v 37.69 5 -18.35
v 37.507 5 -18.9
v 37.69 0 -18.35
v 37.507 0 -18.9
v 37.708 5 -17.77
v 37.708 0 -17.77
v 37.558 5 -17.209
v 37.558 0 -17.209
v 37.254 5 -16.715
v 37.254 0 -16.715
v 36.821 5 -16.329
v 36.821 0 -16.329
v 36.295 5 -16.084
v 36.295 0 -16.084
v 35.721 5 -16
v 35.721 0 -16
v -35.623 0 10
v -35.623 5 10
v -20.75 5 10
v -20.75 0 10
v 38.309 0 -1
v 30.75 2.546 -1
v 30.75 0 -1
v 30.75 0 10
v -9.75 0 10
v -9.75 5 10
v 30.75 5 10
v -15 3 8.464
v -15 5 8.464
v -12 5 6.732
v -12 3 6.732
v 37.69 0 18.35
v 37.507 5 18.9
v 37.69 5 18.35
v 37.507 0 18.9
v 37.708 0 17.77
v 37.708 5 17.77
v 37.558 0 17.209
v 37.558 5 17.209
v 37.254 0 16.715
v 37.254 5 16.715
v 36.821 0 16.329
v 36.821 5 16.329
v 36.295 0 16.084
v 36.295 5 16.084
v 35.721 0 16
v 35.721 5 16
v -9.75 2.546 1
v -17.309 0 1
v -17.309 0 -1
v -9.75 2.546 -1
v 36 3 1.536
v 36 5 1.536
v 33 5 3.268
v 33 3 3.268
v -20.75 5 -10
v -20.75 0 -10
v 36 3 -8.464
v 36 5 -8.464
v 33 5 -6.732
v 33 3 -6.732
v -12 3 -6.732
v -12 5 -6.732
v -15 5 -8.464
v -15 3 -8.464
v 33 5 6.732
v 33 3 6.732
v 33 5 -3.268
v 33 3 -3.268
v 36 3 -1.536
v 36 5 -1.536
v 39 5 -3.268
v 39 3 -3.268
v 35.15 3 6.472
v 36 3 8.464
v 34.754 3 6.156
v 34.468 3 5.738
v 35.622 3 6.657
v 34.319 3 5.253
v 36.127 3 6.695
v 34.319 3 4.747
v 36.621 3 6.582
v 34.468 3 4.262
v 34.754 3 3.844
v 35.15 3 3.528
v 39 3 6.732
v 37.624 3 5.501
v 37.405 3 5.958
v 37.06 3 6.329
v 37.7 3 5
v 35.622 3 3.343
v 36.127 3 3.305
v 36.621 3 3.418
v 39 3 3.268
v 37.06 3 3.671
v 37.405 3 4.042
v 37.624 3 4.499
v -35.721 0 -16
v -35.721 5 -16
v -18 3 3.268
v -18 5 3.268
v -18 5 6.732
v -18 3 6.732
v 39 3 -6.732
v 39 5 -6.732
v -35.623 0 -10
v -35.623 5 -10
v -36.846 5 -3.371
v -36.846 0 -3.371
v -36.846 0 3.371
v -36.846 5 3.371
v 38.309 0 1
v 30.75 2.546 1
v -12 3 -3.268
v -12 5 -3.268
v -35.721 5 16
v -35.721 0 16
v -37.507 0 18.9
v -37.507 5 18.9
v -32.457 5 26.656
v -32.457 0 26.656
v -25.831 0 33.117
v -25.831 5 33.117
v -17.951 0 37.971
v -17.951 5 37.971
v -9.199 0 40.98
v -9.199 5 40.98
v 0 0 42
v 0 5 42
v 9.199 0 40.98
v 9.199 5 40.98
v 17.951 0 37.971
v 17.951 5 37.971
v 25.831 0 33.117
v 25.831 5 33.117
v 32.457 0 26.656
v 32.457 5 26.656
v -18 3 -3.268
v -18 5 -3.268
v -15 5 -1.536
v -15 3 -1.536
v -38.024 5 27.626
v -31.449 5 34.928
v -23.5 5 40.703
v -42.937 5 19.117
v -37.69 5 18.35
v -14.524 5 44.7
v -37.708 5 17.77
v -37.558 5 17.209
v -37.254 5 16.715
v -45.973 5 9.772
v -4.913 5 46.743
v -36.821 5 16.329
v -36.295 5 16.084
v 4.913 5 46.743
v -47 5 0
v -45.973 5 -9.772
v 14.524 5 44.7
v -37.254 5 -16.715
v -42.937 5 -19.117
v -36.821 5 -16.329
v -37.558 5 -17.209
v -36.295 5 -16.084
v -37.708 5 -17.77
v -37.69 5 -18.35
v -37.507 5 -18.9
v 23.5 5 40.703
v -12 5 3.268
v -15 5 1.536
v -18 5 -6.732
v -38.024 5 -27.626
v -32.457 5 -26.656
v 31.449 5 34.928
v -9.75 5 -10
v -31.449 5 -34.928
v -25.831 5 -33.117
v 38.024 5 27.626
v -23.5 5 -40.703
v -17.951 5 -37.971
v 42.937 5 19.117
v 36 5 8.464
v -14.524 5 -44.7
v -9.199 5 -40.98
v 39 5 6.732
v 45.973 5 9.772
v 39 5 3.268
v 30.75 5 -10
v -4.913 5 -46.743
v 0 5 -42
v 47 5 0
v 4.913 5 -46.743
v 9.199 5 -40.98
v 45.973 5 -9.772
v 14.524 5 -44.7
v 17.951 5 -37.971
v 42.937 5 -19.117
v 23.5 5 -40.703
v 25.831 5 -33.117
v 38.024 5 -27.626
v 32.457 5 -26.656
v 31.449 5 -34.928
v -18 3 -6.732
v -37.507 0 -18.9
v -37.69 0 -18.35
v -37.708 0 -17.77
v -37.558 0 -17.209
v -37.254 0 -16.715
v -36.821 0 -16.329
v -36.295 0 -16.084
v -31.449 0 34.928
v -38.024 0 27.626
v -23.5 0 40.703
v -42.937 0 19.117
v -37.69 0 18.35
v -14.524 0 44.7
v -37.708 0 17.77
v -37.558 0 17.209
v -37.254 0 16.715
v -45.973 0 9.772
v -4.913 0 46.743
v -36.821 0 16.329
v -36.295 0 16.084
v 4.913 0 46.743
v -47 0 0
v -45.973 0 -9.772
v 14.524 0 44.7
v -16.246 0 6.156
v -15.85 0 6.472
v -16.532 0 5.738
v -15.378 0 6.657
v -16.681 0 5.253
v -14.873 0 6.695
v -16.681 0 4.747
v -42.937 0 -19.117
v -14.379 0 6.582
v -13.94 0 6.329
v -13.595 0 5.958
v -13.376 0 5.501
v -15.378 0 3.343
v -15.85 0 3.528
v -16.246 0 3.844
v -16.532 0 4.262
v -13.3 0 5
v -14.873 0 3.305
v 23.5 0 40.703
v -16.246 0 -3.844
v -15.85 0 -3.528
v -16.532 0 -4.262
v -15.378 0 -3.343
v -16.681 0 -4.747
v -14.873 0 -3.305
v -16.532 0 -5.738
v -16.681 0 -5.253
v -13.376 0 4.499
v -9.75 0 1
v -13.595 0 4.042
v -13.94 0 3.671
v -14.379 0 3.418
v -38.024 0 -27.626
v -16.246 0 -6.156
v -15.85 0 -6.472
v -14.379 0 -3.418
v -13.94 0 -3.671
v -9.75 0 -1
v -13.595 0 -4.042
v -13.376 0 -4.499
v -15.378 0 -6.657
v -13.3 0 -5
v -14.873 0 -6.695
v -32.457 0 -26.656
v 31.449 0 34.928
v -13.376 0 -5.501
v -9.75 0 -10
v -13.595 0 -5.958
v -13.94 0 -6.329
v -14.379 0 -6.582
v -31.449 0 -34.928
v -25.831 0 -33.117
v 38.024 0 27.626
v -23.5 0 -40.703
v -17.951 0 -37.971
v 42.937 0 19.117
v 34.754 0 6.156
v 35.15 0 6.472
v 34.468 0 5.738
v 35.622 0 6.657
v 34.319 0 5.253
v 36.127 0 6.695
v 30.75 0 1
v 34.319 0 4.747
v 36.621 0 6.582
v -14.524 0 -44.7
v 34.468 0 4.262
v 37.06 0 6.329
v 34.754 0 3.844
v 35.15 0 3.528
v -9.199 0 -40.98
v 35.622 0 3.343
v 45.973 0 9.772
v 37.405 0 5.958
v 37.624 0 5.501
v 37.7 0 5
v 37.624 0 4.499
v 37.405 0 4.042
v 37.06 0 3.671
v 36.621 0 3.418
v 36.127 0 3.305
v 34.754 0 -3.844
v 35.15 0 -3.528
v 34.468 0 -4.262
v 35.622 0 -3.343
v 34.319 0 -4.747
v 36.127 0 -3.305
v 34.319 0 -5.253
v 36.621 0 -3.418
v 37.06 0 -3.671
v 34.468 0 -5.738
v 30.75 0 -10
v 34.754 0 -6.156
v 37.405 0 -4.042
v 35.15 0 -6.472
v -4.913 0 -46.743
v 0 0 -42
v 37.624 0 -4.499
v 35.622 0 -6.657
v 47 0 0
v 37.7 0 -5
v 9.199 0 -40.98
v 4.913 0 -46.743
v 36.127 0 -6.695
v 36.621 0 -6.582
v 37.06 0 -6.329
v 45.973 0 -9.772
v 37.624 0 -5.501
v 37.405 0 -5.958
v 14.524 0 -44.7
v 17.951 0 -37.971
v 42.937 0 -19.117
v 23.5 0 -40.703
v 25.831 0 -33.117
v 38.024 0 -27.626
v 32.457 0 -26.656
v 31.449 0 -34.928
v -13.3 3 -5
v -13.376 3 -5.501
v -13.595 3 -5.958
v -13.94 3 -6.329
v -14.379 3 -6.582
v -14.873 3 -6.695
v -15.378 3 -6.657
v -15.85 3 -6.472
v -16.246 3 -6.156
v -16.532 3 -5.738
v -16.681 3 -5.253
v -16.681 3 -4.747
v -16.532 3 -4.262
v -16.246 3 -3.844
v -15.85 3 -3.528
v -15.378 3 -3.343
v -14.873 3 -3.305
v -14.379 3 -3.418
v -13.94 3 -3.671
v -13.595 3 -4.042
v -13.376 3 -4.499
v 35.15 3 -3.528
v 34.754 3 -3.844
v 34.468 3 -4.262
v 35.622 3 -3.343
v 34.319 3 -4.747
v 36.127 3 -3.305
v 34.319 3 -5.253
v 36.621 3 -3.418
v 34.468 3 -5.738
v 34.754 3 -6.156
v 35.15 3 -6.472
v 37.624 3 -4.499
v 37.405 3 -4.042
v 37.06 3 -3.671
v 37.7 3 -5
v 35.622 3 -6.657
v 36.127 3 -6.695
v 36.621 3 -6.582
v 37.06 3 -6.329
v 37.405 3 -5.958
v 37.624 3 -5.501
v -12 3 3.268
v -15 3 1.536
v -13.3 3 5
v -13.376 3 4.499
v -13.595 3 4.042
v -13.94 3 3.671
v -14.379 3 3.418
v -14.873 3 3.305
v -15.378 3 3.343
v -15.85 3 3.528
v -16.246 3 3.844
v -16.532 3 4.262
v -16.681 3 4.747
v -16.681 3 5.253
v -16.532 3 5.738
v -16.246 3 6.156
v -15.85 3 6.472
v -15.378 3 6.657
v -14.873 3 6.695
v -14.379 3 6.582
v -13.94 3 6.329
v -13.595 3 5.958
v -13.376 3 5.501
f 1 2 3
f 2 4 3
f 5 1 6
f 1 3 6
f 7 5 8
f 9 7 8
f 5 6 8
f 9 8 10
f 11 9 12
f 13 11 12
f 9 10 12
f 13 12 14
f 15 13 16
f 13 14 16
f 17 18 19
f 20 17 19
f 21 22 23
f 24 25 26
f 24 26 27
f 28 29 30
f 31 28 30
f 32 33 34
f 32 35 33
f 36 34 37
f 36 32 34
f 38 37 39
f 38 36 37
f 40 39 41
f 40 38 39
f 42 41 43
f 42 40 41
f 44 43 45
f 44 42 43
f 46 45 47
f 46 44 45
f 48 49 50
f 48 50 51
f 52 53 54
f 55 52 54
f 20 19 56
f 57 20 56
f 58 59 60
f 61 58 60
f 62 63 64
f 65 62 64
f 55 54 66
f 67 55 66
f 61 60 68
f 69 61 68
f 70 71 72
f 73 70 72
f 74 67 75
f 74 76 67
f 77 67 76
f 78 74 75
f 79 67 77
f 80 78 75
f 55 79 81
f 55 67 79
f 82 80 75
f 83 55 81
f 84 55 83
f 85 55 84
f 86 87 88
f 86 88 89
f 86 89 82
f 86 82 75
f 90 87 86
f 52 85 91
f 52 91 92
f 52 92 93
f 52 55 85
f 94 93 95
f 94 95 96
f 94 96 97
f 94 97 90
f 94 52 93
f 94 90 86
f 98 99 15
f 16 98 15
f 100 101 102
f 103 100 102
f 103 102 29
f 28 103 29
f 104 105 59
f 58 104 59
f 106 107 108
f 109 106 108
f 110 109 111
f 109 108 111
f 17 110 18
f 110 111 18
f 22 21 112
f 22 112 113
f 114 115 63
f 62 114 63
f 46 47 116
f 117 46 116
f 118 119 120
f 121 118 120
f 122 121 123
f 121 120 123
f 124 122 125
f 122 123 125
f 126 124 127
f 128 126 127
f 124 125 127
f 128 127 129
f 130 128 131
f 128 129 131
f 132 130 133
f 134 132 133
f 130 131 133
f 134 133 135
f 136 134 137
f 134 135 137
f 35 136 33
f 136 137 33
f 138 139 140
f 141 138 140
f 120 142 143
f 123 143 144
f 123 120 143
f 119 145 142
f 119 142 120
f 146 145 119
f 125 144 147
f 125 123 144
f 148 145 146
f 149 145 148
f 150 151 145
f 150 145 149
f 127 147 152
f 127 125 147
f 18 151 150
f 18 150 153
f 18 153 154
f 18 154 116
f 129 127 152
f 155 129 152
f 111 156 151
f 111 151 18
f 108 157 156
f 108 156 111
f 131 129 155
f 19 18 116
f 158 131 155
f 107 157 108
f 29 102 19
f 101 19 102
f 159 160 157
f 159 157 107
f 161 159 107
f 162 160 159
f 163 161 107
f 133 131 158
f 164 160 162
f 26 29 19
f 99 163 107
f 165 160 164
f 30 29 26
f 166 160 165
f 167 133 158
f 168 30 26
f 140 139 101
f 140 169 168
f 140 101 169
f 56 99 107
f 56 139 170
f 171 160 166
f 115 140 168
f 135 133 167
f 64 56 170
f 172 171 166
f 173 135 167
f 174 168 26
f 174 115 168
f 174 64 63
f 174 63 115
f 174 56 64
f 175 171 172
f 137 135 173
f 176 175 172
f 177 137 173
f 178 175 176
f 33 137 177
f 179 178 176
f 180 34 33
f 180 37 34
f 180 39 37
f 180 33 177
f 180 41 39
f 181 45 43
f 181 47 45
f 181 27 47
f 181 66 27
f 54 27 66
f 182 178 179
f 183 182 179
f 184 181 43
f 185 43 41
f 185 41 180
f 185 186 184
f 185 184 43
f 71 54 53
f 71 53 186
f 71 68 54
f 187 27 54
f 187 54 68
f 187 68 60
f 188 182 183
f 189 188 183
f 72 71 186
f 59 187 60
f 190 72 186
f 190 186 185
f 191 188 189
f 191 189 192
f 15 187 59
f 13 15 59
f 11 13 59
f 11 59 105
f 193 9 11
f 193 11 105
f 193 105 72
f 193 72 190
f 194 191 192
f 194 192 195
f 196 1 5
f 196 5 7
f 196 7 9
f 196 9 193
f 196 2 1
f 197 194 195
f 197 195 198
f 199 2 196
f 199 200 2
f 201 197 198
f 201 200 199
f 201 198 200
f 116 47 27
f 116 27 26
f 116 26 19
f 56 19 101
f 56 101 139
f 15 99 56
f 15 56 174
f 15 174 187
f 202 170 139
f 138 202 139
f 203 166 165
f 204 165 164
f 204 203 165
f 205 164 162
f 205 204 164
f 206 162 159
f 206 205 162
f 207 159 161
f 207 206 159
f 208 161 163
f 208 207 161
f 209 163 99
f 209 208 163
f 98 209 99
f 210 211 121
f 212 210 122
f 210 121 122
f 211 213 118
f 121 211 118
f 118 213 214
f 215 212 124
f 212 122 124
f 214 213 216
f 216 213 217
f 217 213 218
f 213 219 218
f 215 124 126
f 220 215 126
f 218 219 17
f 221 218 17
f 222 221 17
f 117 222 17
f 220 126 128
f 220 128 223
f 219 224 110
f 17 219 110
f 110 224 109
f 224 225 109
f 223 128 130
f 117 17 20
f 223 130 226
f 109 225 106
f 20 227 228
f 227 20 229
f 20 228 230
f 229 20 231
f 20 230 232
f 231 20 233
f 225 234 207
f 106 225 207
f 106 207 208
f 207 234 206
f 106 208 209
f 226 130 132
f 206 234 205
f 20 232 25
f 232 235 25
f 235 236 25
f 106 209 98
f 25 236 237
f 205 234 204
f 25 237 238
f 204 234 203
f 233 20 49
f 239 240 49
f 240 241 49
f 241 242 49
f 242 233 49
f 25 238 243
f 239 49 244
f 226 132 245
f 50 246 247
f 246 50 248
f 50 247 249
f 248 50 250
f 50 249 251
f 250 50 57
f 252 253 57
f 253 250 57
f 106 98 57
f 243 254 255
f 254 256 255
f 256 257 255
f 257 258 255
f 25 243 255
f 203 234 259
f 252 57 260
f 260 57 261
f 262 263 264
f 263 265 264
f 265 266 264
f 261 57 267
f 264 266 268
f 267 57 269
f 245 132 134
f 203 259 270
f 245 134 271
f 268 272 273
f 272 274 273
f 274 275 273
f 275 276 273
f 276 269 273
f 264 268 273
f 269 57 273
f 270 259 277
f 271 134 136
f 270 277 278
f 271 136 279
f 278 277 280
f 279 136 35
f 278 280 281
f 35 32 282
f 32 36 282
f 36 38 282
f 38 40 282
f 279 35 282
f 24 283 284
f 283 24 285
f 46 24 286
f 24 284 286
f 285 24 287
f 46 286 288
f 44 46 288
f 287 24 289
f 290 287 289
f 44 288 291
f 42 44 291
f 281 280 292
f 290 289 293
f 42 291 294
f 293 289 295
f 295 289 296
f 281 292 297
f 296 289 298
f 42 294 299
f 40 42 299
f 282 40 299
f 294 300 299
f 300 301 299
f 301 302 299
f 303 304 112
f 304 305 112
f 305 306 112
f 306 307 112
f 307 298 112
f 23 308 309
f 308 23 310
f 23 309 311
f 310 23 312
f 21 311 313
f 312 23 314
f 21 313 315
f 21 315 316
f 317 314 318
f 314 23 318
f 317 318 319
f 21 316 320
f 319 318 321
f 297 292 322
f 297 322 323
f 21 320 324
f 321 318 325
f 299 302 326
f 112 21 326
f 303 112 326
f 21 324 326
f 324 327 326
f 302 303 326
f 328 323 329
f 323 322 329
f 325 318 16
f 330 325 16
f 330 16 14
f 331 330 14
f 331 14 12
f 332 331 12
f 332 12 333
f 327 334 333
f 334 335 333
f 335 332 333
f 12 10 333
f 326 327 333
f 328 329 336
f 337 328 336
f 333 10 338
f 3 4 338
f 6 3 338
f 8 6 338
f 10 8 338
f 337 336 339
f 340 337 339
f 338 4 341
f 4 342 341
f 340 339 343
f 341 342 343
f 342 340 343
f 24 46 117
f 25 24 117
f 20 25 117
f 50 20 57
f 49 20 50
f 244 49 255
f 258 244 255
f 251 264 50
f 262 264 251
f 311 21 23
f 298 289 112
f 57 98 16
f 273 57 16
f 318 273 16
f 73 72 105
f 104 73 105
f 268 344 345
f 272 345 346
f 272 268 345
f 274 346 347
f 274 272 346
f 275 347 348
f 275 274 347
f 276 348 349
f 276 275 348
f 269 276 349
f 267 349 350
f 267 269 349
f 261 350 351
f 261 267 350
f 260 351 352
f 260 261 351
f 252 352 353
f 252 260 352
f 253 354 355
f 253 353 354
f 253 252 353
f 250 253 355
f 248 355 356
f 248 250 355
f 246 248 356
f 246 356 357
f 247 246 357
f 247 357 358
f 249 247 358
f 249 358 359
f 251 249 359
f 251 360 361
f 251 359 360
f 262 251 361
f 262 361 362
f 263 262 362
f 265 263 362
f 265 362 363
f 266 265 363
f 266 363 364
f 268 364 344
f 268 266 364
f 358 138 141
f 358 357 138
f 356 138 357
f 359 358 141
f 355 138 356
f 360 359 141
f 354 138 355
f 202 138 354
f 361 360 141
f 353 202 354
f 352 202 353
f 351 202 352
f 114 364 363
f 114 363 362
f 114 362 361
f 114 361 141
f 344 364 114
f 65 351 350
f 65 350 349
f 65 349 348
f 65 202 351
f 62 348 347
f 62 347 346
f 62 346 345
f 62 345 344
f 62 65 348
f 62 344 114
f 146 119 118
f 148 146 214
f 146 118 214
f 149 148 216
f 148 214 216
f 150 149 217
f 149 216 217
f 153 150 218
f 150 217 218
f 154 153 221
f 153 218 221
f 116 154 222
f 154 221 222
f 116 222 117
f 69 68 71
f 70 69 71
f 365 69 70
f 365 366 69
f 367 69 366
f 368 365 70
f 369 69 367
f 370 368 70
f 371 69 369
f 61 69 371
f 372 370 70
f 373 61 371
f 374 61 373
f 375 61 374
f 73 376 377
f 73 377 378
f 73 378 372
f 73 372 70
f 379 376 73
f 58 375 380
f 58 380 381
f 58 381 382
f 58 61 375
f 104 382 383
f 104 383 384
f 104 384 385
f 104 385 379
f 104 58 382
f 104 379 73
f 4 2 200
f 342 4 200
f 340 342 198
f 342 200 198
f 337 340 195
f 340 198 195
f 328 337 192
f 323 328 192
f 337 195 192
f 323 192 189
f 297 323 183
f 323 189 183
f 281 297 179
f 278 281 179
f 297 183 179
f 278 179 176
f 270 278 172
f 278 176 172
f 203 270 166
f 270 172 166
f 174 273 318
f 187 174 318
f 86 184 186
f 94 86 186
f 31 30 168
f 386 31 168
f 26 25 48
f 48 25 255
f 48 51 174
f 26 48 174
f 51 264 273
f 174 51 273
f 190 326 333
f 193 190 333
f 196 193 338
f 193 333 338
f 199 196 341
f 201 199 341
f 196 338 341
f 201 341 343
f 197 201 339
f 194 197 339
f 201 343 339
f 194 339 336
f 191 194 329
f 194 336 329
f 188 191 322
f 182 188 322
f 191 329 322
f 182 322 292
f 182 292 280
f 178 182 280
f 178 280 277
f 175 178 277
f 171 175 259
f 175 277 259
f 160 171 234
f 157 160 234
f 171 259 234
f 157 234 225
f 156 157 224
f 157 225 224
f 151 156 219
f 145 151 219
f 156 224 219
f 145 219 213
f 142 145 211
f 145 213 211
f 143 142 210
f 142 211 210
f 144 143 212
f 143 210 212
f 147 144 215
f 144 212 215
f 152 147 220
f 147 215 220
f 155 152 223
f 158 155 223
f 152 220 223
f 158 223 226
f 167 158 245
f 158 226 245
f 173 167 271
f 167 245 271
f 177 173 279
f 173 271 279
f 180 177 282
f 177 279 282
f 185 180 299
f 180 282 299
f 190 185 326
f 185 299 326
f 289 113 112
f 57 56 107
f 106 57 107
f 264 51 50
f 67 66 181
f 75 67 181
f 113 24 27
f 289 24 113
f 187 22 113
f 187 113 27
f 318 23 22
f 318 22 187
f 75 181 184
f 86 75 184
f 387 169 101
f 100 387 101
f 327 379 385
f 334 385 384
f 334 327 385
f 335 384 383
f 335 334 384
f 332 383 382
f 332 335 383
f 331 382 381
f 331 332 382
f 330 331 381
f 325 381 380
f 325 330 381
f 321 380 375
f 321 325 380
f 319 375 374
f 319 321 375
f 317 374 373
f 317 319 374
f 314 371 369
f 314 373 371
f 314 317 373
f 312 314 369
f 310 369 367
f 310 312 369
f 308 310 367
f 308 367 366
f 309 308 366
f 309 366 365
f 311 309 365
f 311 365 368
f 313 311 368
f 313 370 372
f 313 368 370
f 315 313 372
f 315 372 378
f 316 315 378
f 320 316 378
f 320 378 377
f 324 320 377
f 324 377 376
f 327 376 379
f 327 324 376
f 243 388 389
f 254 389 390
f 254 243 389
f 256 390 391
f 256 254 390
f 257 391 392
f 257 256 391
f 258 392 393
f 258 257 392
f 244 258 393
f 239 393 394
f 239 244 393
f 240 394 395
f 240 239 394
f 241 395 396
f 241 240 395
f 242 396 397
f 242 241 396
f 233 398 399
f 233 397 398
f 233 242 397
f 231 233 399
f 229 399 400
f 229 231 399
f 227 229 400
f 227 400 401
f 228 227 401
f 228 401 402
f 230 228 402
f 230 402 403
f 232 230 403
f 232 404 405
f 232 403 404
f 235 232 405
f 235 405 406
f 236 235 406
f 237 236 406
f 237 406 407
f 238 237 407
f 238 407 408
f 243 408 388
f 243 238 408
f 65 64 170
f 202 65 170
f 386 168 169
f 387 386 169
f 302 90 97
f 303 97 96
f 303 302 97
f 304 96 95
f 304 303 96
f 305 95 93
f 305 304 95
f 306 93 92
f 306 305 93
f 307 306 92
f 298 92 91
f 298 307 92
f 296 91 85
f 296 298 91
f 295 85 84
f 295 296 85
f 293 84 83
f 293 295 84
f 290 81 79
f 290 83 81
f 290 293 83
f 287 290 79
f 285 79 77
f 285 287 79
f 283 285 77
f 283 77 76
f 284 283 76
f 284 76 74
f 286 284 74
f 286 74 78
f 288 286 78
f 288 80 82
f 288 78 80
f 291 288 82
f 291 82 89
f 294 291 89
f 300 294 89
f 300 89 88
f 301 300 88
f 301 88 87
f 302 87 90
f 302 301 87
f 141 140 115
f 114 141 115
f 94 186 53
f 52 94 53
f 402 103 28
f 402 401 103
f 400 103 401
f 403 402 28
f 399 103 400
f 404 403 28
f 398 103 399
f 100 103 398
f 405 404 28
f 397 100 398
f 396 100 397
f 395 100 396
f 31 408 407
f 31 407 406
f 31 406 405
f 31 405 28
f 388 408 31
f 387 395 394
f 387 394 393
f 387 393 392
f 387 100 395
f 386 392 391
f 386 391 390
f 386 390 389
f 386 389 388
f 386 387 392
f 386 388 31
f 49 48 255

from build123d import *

# Parameters (mm, degrees)
SKETCH_1_R          = 47
SKETCH_1_R_2        = 1.7
SKETCH_1_W          = 40.5
SKETCH_1_H          = 20
EXTRUDE_1_DEPTH     = 5
CUT_EXTRUDE_1_DEPTH = 2
CUT_EXTRUDE_2_DEPTH = 1
CUT_EXTRUDE_3_DEPTH = 6
FILLET_1_R          = 2


with BuildPart() as part:
    # Эскиз1 → Бобышка-Вытянуть1 (new body)
    with BuildSketch(Plane(origin=(0, 0, 0), x_dir=(1, 0, 0), z_dir=(0, 1, 0))):
        Circle(SKETCH_1_R)
        with Locations((-15, 5)):
            Circle(SKETCH_1_R_2, mode=Mode.SUBTRACT)
        with Locations((-15, -5)):
            Circle(SKETCH_1_R_2, mode=Mode.SUBTRACT)
        with Locations((36, 5)):
            Circle(SKETCH_1_R_2, mode=Mode.SUBTRACT)
        with Locations((36, -5)):
            Circle(SKETCH_1_R_2, mode=Mode.SUBTRACT)
        with Locations((10.5, 0)):
            Rectangle(SKETCH_1_W, SKETCH_1_H, mode=Mode.SUBTRACT)
    extrude(amount=EXTRUDE_1_DEPTH)

    # Эскиз2 → Вырез-Вытянуть1 (cut)
    with BuildSketch(Plane(origin=(0, 5, 0), x_dir=(1, 0, 0), z_dir=(0, 1, 0))):
        Polygon((-12, 6.732050808), (-15, 8.464101615), (-18, 6.732050808), (-18, 3.267949192), (-15, 1.535898385), (-12, 3.267949192), align=None)
        Polygon((-12, -3.267949192), (-15, -1.535898385), (-18, -3.267949192), (-18, -6.732050808), (-15, -8.464101615), (-12, -6.732050808), align=None)
        Polygon((36, 8.464101615), (33, 6.732050808), (33, 3.267949192), (36, 1.535898385), (39, 3.267949192), (39, 6.732050808), align=None)
        Polygon((36, -1.535898385), (33, -3.267949192), (33, -6.732050808), (36, -8.464101615), (39, -6.732050808), (39, -3.267949192), align=None)
    extrude(amount=-CUT_EXTRUDE_1_DEPTH, mode=Mode.SUBTRACT)

    # Эскиз3 → Вырез-Вытянуть2 (cut, symmetric)
    with BuildSketch(Plane.XY):
        Polygon((27.412104095, 3.670718329), (30.75, 0), (38.308934037, 0), align=None)
        Polygon((-6.412104095, 3.670718329), (-9.75, 0), (-17.308934037, 0), align=None)
    extrude(amount=CUT_EXTRUDE_2_DEPTH, both=True, mode=Mode.SUBTRACT)

    # Эскиз4 → Вырез-Вытянуть3 (cut, through all)
    with BuildSketch(Plane(origin=(0, 5, 0), x_dir=(1, 0, 0), z_dir=(0, 1, 0))):
        with BuildLine():
            ThreePointArc((-38.832975678, -16), (0, -42), (38.832975678, -16))
            Line((38.832975678, -16), (-38.832975678, -16))
        make_face()
        with BuildLine():
            ThreePointArc((38.832975678, 16), (0, 42), (-38.832975678, 16))
            Line((-38.832975678, 16), (38.832975678, 16))
        make_face()
        with BuildLine():
            Line((-35.623026261, -10), (-20.75, -10))
            Line((-20.75, -10), (-20.75, 10))
            Line((-20.75, 10), (-35.623026261, 10))
            ThreePointArc((-35.623026261, 10), (-37, 0), (-35.623026261, -10))
        make_face()
    extrude(amount=-CUT_EXTRUDE_3_DEPTH, mode=Mode.SUBTRACT)

    # Скругление1
    fillet_1_edges = [part.edges().sort_by_distance(p)[0] for p in [
        (-38.832975678, 2.5, 16),
        (38.832975678, 2.5, 16),
        (38.832975678, 2.5, -16),
        (-38.832975678, 2.5, -16),
    ]]
    fillet(fillet_1_edges, radius=FILLET_1_R)


solid = part.part
